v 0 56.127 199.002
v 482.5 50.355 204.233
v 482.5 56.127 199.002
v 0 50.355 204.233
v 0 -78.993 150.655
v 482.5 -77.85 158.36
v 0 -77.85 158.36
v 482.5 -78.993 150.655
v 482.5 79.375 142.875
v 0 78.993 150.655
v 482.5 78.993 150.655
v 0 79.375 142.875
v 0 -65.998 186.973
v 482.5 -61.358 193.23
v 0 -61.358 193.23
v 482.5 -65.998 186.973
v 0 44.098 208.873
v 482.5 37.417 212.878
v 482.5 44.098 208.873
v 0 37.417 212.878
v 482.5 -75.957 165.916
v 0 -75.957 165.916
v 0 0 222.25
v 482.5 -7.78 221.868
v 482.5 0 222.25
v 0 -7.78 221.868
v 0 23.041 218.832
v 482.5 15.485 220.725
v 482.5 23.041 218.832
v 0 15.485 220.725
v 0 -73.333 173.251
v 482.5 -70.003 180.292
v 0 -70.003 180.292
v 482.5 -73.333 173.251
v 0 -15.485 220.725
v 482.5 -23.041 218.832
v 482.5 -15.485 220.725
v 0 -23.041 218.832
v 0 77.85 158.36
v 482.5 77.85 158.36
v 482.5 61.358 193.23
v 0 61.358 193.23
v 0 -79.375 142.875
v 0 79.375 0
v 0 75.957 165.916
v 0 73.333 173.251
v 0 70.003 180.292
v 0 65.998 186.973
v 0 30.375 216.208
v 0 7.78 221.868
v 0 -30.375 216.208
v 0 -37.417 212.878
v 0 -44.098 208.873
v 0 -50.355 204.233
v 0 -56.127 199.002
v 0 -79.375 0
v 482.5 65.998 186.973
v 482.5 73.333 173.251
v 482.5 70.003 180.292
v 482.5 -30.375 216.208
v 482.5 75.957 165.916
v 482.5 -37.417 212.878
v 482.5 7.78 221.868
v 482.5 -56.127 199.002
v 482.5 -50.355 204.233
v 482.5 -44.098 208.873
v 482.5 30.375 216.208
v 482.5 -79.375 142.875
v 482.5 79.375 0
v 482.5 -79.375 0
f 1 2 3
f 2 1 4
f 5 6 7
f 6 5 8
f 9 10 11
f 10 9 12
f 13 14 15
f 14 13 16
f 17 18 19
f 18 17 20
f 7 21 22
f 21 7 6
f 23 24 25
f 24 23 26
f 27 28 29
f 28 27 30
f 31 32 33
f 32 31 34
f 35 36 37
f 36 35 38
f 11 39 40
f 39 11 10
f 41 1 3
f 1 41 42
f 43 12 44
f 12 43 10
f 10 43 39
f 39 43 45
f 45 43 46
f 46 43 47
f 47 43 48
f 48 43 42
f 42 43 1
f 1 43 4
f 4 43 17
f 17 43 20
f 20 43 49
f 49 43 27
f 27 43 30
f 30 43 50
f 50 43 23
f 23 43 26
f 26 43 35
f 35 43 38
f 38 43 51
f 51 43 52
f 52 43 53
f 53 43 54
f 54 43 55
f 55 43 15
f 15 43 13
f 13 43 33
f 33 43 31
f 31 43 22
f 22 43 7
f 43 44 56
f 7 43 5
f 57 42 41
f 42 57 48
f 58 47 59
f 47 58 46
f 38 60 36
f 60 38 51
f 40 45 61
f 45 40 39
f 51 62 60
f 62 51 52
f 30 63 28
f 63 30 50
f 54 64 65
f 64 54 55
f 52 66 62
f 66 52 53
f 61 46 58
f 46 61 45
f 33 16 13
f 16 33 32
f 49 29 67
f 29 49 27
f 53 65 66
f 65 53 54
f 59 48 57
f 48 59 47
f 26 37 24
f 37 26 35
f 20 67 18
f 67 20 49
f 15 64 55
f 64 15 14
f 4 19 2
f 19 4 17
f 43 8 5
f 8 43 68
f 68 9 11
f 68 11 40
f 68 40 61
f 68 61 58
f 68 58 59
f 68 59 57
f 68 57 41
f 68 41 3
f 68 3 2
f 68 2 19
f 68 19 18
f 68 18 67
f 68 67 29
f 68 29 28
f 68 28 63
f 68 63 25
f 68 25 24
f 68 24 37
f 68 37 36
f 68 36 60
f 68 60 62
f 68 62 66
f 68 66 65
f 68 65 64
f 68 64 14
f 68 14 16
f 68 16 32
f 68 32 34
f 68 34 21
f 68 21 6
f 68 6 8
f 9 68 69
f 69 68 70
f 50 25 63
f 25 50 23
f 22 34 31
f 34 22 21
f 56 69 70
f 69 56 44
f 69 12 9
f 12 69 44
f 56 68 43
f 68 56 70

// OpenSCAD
$fn=64;

mailbox();

module mailbox() {
  l=482.5;
  w=158.75;
  h=222.25;

  translate([0,0,h-w/2]) rotate([0,90,0]) {
    cylinder(r=w/2,h=l);
    translate([0,-w/2,0]) cube([h-w/2,w,l]);
  }
}
